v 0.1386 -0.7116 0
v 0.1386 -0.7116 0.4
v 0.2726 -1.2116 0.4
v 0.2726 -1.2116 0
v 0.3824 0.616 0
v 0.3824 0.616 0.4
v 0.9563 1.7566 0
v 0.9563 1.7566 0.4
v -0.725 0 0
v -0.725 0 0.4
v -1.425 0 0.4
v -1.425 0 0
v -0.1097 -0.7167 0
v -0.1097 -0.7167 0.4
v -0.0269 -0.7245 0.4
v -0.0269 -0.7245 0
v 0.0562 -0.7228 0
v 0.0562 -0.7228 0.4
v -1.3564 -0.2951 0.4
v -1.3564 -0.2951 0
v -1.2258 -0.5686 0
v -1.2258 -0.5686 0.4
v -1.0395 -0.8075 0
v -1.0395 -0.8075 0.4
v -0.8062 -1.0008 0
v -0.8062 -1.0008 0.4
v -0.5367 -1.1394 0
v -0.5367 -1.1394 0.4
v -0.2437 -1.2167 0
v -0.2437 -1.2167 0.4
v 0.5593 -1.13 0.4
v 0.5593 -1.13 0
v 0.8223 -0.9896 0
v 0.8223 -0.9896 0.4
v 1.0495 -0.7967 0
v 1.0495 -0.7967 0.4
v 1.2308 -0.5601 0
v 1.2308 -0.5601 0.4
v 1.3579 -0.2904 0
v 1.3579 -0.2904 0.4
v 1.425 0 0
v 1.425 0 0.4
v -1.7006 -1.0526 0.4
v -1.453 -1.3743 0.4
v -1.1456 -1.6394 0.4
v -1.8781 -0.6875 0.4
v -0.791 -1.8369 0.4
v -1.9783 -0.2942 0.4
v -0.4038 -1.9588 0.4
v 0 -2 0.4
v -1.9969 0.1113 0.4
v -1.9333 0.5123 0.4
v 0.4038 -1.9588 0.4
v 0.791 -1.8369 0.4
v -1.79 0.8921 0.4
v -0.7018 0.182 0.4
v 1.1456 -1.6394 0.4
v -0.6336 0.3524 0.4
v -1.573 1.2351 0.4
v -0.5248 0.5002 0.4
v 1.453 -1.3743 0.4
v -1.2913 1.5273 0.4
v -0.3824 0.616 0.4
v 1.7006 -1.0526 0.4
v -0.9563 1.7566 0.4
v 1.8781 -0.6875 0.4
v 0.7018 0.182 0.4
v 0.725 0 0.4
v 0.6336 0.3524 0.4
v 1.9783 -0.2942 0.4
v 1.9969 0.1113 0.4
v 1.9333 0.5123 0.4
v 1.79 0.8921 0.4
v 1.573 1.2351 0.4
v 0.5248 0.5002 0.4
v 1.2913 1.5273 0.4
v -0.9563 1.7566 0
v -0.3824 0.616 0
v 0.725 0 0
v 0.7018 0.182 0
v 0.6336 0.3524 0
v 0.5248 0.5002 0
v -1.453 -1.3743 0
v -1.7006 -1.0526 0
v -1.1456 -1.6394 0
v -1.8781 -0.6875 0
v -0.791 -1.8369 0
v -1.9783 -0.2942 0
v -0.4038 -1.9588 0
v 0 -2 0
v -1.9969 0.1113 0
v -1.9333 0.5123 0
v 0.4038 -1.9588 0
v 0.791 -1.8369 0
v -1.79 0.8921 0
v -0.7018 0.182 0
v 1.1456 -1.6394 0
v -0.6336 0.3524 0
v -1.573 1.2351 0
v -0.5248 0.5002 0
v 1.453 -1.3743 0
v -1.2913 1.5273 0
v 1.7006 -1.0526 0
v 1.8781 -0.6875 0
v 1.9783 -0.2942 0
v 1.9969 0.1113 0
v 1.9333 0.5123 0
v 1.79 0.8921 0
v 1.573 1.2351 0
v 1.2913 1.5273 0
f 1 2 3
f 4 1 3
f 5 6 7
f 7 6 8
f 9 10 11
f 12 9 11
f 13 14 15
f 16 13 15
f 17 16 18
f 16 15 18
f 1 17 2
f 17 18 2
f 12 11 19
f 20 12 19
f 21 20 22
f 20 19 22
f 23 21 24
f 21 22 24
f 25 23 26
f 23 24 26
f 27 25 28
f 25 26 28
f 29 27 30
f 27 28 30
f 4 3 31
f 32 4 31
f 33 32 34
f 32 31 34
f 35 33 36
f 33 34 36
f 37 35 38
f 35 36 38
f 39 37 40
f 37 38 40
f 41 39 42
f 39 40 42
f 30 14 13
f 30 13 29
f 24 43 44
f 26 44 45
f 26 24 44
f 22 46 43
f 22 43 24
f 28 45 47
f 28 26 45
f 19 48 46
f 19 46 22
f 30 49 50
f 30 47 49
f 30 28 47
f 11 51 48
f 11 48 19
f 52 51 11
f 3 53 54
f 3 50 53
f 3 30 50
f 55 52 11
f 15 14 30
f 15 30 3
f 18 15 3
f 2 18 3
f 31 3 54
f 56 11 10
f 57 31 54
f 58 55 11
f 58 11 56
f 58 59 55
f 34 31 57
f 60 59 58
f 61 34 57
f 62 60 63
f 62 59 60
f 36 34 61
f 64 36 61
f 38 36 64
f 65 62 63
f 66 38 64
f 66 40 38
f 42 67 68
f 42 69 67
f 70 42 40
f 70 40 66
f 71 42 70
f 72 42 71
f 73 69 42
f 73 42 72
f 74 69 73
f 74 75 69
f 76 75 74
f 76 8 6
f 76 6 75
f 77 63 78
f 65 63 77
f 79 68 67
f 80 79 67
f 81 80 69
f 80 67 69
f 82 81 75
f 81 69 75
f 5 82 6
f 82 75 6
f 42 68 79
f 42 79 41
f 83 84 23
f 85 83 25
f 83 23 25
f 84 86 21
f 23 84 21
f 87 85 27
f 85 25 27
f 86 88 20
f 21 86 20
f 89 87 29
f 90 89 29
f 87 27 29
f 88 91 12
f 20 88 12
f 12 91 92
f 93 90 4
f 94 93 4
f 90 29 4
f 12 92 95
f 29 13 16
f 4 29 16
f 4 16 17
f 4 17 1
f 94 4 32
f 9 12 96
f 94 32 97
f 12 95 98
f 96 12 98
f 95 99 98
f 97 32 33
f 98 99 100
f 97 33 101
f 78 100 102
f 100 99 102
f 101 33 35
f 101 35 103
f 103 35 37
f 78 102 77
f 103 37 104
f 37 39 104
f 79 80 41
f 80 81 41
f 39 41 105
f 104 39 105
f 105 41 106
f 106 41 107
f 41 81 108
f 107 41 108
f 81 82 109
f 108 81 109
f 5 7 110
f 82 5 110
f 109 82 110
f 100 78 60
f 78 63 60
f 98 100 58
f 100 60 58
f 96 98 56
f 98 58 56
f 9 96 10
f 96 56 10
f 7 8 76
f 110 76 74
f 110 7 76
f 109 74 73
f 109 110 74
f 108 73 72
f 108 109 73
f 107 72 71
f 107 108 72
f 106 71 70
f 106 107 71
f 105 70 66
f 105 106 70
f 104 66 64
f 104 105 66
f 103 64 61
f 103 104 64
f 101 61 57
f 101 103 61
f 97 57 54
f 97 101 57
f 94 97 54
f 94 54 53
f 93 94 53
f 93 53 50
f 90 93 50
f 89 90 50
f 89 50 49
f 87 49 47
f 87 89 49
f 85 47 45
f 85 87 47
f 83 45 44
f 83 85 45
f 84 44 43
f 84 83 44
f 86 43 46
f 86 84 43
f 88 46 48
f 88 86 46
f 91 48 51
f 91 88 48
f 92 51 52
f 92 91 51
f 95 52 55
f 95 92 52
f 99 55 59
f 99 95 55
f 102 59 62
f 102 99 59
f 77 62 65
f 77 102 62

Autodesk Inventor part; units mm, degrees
ref_plane "YZ Plane" through (0, 0, 0) normal (1, 0, 0) x (0, 1, 0)
ref_plane "XZ Plane" through (0, 0, 0) normal (0, 1, 0) x (-1, 0, 0)
ref_plane "XY Plane" through (0, 0, 0) normal (0, 0, 1) x (1, 0, 0)
sketch "Skizze1" plane through (0, 0, 0) normal (0, 0, 1) x (1, 0, 0)
  circle A0 centre (0, 0) radius 2
  dimension "d0" = 4
extrude "Extrusion1" add sketch "Skizze1" along normal blind 0.4
sketch "Skizze2" plane through (0, 0, 0.4) normal (0, 0, 1) x (1, 0, 0)
  circle A0 centre (0, 0) radius 0.725
  line L0 (-0.3824, 0.616) -> (-0.9563, 1.7566)
  circle A1 centre (0, 0) radius 2 projected
  line L1 (0.3824, 0.616) -> (0.9563, 1.7566)
  line L2 (-0.725, 0) -> (-1.425, 0)
  line L3 (-0.1097, -0.7167) -> (-0.2437, -1.2167)
  arc A2 (-1.425, 0) -> (-0.2437, -1.2167) centre (-0.0351, 0.1677) ccw
  line L4 (0.725, 0) -> (1.425, 0)
  line L5 (0.1386, -0.7116) -> (0.2726, -1.2116)
  arc A3 (0.2726, -1.2116) -> (1.425, 0) centre (0.0351, 0.1681) ccw
  line L6 (0, 0) -> (2, 0) construction
  line L7 (0, 0) -> (-2, 0) construction
  dimension "d3" = 1.45
  dimension "d4" = 1.4
  dimension "d5" = 1.4
  dimension "d6" = 75
  dimension "d7" = 75
  dimension "d8" = 0.7
  dimension "d9" = 0.7
  dimension "d10" = 0.5
  dimension "d11" = 0.5
extrude "Extrusion2" cut sketch "Skizze2" against normal through all contours A0 | L4 A3 L5 A0 | A0 L0 A1 L1 | L3 A2 L2 A0
equation "\"d5\" = d4"
equation "\"d7\" = d6"
equation "\"d9\" = d8"
equation "\"d11\" = d10"
properties part number "clamp_ring" material "Stahl, geschmiedet"
